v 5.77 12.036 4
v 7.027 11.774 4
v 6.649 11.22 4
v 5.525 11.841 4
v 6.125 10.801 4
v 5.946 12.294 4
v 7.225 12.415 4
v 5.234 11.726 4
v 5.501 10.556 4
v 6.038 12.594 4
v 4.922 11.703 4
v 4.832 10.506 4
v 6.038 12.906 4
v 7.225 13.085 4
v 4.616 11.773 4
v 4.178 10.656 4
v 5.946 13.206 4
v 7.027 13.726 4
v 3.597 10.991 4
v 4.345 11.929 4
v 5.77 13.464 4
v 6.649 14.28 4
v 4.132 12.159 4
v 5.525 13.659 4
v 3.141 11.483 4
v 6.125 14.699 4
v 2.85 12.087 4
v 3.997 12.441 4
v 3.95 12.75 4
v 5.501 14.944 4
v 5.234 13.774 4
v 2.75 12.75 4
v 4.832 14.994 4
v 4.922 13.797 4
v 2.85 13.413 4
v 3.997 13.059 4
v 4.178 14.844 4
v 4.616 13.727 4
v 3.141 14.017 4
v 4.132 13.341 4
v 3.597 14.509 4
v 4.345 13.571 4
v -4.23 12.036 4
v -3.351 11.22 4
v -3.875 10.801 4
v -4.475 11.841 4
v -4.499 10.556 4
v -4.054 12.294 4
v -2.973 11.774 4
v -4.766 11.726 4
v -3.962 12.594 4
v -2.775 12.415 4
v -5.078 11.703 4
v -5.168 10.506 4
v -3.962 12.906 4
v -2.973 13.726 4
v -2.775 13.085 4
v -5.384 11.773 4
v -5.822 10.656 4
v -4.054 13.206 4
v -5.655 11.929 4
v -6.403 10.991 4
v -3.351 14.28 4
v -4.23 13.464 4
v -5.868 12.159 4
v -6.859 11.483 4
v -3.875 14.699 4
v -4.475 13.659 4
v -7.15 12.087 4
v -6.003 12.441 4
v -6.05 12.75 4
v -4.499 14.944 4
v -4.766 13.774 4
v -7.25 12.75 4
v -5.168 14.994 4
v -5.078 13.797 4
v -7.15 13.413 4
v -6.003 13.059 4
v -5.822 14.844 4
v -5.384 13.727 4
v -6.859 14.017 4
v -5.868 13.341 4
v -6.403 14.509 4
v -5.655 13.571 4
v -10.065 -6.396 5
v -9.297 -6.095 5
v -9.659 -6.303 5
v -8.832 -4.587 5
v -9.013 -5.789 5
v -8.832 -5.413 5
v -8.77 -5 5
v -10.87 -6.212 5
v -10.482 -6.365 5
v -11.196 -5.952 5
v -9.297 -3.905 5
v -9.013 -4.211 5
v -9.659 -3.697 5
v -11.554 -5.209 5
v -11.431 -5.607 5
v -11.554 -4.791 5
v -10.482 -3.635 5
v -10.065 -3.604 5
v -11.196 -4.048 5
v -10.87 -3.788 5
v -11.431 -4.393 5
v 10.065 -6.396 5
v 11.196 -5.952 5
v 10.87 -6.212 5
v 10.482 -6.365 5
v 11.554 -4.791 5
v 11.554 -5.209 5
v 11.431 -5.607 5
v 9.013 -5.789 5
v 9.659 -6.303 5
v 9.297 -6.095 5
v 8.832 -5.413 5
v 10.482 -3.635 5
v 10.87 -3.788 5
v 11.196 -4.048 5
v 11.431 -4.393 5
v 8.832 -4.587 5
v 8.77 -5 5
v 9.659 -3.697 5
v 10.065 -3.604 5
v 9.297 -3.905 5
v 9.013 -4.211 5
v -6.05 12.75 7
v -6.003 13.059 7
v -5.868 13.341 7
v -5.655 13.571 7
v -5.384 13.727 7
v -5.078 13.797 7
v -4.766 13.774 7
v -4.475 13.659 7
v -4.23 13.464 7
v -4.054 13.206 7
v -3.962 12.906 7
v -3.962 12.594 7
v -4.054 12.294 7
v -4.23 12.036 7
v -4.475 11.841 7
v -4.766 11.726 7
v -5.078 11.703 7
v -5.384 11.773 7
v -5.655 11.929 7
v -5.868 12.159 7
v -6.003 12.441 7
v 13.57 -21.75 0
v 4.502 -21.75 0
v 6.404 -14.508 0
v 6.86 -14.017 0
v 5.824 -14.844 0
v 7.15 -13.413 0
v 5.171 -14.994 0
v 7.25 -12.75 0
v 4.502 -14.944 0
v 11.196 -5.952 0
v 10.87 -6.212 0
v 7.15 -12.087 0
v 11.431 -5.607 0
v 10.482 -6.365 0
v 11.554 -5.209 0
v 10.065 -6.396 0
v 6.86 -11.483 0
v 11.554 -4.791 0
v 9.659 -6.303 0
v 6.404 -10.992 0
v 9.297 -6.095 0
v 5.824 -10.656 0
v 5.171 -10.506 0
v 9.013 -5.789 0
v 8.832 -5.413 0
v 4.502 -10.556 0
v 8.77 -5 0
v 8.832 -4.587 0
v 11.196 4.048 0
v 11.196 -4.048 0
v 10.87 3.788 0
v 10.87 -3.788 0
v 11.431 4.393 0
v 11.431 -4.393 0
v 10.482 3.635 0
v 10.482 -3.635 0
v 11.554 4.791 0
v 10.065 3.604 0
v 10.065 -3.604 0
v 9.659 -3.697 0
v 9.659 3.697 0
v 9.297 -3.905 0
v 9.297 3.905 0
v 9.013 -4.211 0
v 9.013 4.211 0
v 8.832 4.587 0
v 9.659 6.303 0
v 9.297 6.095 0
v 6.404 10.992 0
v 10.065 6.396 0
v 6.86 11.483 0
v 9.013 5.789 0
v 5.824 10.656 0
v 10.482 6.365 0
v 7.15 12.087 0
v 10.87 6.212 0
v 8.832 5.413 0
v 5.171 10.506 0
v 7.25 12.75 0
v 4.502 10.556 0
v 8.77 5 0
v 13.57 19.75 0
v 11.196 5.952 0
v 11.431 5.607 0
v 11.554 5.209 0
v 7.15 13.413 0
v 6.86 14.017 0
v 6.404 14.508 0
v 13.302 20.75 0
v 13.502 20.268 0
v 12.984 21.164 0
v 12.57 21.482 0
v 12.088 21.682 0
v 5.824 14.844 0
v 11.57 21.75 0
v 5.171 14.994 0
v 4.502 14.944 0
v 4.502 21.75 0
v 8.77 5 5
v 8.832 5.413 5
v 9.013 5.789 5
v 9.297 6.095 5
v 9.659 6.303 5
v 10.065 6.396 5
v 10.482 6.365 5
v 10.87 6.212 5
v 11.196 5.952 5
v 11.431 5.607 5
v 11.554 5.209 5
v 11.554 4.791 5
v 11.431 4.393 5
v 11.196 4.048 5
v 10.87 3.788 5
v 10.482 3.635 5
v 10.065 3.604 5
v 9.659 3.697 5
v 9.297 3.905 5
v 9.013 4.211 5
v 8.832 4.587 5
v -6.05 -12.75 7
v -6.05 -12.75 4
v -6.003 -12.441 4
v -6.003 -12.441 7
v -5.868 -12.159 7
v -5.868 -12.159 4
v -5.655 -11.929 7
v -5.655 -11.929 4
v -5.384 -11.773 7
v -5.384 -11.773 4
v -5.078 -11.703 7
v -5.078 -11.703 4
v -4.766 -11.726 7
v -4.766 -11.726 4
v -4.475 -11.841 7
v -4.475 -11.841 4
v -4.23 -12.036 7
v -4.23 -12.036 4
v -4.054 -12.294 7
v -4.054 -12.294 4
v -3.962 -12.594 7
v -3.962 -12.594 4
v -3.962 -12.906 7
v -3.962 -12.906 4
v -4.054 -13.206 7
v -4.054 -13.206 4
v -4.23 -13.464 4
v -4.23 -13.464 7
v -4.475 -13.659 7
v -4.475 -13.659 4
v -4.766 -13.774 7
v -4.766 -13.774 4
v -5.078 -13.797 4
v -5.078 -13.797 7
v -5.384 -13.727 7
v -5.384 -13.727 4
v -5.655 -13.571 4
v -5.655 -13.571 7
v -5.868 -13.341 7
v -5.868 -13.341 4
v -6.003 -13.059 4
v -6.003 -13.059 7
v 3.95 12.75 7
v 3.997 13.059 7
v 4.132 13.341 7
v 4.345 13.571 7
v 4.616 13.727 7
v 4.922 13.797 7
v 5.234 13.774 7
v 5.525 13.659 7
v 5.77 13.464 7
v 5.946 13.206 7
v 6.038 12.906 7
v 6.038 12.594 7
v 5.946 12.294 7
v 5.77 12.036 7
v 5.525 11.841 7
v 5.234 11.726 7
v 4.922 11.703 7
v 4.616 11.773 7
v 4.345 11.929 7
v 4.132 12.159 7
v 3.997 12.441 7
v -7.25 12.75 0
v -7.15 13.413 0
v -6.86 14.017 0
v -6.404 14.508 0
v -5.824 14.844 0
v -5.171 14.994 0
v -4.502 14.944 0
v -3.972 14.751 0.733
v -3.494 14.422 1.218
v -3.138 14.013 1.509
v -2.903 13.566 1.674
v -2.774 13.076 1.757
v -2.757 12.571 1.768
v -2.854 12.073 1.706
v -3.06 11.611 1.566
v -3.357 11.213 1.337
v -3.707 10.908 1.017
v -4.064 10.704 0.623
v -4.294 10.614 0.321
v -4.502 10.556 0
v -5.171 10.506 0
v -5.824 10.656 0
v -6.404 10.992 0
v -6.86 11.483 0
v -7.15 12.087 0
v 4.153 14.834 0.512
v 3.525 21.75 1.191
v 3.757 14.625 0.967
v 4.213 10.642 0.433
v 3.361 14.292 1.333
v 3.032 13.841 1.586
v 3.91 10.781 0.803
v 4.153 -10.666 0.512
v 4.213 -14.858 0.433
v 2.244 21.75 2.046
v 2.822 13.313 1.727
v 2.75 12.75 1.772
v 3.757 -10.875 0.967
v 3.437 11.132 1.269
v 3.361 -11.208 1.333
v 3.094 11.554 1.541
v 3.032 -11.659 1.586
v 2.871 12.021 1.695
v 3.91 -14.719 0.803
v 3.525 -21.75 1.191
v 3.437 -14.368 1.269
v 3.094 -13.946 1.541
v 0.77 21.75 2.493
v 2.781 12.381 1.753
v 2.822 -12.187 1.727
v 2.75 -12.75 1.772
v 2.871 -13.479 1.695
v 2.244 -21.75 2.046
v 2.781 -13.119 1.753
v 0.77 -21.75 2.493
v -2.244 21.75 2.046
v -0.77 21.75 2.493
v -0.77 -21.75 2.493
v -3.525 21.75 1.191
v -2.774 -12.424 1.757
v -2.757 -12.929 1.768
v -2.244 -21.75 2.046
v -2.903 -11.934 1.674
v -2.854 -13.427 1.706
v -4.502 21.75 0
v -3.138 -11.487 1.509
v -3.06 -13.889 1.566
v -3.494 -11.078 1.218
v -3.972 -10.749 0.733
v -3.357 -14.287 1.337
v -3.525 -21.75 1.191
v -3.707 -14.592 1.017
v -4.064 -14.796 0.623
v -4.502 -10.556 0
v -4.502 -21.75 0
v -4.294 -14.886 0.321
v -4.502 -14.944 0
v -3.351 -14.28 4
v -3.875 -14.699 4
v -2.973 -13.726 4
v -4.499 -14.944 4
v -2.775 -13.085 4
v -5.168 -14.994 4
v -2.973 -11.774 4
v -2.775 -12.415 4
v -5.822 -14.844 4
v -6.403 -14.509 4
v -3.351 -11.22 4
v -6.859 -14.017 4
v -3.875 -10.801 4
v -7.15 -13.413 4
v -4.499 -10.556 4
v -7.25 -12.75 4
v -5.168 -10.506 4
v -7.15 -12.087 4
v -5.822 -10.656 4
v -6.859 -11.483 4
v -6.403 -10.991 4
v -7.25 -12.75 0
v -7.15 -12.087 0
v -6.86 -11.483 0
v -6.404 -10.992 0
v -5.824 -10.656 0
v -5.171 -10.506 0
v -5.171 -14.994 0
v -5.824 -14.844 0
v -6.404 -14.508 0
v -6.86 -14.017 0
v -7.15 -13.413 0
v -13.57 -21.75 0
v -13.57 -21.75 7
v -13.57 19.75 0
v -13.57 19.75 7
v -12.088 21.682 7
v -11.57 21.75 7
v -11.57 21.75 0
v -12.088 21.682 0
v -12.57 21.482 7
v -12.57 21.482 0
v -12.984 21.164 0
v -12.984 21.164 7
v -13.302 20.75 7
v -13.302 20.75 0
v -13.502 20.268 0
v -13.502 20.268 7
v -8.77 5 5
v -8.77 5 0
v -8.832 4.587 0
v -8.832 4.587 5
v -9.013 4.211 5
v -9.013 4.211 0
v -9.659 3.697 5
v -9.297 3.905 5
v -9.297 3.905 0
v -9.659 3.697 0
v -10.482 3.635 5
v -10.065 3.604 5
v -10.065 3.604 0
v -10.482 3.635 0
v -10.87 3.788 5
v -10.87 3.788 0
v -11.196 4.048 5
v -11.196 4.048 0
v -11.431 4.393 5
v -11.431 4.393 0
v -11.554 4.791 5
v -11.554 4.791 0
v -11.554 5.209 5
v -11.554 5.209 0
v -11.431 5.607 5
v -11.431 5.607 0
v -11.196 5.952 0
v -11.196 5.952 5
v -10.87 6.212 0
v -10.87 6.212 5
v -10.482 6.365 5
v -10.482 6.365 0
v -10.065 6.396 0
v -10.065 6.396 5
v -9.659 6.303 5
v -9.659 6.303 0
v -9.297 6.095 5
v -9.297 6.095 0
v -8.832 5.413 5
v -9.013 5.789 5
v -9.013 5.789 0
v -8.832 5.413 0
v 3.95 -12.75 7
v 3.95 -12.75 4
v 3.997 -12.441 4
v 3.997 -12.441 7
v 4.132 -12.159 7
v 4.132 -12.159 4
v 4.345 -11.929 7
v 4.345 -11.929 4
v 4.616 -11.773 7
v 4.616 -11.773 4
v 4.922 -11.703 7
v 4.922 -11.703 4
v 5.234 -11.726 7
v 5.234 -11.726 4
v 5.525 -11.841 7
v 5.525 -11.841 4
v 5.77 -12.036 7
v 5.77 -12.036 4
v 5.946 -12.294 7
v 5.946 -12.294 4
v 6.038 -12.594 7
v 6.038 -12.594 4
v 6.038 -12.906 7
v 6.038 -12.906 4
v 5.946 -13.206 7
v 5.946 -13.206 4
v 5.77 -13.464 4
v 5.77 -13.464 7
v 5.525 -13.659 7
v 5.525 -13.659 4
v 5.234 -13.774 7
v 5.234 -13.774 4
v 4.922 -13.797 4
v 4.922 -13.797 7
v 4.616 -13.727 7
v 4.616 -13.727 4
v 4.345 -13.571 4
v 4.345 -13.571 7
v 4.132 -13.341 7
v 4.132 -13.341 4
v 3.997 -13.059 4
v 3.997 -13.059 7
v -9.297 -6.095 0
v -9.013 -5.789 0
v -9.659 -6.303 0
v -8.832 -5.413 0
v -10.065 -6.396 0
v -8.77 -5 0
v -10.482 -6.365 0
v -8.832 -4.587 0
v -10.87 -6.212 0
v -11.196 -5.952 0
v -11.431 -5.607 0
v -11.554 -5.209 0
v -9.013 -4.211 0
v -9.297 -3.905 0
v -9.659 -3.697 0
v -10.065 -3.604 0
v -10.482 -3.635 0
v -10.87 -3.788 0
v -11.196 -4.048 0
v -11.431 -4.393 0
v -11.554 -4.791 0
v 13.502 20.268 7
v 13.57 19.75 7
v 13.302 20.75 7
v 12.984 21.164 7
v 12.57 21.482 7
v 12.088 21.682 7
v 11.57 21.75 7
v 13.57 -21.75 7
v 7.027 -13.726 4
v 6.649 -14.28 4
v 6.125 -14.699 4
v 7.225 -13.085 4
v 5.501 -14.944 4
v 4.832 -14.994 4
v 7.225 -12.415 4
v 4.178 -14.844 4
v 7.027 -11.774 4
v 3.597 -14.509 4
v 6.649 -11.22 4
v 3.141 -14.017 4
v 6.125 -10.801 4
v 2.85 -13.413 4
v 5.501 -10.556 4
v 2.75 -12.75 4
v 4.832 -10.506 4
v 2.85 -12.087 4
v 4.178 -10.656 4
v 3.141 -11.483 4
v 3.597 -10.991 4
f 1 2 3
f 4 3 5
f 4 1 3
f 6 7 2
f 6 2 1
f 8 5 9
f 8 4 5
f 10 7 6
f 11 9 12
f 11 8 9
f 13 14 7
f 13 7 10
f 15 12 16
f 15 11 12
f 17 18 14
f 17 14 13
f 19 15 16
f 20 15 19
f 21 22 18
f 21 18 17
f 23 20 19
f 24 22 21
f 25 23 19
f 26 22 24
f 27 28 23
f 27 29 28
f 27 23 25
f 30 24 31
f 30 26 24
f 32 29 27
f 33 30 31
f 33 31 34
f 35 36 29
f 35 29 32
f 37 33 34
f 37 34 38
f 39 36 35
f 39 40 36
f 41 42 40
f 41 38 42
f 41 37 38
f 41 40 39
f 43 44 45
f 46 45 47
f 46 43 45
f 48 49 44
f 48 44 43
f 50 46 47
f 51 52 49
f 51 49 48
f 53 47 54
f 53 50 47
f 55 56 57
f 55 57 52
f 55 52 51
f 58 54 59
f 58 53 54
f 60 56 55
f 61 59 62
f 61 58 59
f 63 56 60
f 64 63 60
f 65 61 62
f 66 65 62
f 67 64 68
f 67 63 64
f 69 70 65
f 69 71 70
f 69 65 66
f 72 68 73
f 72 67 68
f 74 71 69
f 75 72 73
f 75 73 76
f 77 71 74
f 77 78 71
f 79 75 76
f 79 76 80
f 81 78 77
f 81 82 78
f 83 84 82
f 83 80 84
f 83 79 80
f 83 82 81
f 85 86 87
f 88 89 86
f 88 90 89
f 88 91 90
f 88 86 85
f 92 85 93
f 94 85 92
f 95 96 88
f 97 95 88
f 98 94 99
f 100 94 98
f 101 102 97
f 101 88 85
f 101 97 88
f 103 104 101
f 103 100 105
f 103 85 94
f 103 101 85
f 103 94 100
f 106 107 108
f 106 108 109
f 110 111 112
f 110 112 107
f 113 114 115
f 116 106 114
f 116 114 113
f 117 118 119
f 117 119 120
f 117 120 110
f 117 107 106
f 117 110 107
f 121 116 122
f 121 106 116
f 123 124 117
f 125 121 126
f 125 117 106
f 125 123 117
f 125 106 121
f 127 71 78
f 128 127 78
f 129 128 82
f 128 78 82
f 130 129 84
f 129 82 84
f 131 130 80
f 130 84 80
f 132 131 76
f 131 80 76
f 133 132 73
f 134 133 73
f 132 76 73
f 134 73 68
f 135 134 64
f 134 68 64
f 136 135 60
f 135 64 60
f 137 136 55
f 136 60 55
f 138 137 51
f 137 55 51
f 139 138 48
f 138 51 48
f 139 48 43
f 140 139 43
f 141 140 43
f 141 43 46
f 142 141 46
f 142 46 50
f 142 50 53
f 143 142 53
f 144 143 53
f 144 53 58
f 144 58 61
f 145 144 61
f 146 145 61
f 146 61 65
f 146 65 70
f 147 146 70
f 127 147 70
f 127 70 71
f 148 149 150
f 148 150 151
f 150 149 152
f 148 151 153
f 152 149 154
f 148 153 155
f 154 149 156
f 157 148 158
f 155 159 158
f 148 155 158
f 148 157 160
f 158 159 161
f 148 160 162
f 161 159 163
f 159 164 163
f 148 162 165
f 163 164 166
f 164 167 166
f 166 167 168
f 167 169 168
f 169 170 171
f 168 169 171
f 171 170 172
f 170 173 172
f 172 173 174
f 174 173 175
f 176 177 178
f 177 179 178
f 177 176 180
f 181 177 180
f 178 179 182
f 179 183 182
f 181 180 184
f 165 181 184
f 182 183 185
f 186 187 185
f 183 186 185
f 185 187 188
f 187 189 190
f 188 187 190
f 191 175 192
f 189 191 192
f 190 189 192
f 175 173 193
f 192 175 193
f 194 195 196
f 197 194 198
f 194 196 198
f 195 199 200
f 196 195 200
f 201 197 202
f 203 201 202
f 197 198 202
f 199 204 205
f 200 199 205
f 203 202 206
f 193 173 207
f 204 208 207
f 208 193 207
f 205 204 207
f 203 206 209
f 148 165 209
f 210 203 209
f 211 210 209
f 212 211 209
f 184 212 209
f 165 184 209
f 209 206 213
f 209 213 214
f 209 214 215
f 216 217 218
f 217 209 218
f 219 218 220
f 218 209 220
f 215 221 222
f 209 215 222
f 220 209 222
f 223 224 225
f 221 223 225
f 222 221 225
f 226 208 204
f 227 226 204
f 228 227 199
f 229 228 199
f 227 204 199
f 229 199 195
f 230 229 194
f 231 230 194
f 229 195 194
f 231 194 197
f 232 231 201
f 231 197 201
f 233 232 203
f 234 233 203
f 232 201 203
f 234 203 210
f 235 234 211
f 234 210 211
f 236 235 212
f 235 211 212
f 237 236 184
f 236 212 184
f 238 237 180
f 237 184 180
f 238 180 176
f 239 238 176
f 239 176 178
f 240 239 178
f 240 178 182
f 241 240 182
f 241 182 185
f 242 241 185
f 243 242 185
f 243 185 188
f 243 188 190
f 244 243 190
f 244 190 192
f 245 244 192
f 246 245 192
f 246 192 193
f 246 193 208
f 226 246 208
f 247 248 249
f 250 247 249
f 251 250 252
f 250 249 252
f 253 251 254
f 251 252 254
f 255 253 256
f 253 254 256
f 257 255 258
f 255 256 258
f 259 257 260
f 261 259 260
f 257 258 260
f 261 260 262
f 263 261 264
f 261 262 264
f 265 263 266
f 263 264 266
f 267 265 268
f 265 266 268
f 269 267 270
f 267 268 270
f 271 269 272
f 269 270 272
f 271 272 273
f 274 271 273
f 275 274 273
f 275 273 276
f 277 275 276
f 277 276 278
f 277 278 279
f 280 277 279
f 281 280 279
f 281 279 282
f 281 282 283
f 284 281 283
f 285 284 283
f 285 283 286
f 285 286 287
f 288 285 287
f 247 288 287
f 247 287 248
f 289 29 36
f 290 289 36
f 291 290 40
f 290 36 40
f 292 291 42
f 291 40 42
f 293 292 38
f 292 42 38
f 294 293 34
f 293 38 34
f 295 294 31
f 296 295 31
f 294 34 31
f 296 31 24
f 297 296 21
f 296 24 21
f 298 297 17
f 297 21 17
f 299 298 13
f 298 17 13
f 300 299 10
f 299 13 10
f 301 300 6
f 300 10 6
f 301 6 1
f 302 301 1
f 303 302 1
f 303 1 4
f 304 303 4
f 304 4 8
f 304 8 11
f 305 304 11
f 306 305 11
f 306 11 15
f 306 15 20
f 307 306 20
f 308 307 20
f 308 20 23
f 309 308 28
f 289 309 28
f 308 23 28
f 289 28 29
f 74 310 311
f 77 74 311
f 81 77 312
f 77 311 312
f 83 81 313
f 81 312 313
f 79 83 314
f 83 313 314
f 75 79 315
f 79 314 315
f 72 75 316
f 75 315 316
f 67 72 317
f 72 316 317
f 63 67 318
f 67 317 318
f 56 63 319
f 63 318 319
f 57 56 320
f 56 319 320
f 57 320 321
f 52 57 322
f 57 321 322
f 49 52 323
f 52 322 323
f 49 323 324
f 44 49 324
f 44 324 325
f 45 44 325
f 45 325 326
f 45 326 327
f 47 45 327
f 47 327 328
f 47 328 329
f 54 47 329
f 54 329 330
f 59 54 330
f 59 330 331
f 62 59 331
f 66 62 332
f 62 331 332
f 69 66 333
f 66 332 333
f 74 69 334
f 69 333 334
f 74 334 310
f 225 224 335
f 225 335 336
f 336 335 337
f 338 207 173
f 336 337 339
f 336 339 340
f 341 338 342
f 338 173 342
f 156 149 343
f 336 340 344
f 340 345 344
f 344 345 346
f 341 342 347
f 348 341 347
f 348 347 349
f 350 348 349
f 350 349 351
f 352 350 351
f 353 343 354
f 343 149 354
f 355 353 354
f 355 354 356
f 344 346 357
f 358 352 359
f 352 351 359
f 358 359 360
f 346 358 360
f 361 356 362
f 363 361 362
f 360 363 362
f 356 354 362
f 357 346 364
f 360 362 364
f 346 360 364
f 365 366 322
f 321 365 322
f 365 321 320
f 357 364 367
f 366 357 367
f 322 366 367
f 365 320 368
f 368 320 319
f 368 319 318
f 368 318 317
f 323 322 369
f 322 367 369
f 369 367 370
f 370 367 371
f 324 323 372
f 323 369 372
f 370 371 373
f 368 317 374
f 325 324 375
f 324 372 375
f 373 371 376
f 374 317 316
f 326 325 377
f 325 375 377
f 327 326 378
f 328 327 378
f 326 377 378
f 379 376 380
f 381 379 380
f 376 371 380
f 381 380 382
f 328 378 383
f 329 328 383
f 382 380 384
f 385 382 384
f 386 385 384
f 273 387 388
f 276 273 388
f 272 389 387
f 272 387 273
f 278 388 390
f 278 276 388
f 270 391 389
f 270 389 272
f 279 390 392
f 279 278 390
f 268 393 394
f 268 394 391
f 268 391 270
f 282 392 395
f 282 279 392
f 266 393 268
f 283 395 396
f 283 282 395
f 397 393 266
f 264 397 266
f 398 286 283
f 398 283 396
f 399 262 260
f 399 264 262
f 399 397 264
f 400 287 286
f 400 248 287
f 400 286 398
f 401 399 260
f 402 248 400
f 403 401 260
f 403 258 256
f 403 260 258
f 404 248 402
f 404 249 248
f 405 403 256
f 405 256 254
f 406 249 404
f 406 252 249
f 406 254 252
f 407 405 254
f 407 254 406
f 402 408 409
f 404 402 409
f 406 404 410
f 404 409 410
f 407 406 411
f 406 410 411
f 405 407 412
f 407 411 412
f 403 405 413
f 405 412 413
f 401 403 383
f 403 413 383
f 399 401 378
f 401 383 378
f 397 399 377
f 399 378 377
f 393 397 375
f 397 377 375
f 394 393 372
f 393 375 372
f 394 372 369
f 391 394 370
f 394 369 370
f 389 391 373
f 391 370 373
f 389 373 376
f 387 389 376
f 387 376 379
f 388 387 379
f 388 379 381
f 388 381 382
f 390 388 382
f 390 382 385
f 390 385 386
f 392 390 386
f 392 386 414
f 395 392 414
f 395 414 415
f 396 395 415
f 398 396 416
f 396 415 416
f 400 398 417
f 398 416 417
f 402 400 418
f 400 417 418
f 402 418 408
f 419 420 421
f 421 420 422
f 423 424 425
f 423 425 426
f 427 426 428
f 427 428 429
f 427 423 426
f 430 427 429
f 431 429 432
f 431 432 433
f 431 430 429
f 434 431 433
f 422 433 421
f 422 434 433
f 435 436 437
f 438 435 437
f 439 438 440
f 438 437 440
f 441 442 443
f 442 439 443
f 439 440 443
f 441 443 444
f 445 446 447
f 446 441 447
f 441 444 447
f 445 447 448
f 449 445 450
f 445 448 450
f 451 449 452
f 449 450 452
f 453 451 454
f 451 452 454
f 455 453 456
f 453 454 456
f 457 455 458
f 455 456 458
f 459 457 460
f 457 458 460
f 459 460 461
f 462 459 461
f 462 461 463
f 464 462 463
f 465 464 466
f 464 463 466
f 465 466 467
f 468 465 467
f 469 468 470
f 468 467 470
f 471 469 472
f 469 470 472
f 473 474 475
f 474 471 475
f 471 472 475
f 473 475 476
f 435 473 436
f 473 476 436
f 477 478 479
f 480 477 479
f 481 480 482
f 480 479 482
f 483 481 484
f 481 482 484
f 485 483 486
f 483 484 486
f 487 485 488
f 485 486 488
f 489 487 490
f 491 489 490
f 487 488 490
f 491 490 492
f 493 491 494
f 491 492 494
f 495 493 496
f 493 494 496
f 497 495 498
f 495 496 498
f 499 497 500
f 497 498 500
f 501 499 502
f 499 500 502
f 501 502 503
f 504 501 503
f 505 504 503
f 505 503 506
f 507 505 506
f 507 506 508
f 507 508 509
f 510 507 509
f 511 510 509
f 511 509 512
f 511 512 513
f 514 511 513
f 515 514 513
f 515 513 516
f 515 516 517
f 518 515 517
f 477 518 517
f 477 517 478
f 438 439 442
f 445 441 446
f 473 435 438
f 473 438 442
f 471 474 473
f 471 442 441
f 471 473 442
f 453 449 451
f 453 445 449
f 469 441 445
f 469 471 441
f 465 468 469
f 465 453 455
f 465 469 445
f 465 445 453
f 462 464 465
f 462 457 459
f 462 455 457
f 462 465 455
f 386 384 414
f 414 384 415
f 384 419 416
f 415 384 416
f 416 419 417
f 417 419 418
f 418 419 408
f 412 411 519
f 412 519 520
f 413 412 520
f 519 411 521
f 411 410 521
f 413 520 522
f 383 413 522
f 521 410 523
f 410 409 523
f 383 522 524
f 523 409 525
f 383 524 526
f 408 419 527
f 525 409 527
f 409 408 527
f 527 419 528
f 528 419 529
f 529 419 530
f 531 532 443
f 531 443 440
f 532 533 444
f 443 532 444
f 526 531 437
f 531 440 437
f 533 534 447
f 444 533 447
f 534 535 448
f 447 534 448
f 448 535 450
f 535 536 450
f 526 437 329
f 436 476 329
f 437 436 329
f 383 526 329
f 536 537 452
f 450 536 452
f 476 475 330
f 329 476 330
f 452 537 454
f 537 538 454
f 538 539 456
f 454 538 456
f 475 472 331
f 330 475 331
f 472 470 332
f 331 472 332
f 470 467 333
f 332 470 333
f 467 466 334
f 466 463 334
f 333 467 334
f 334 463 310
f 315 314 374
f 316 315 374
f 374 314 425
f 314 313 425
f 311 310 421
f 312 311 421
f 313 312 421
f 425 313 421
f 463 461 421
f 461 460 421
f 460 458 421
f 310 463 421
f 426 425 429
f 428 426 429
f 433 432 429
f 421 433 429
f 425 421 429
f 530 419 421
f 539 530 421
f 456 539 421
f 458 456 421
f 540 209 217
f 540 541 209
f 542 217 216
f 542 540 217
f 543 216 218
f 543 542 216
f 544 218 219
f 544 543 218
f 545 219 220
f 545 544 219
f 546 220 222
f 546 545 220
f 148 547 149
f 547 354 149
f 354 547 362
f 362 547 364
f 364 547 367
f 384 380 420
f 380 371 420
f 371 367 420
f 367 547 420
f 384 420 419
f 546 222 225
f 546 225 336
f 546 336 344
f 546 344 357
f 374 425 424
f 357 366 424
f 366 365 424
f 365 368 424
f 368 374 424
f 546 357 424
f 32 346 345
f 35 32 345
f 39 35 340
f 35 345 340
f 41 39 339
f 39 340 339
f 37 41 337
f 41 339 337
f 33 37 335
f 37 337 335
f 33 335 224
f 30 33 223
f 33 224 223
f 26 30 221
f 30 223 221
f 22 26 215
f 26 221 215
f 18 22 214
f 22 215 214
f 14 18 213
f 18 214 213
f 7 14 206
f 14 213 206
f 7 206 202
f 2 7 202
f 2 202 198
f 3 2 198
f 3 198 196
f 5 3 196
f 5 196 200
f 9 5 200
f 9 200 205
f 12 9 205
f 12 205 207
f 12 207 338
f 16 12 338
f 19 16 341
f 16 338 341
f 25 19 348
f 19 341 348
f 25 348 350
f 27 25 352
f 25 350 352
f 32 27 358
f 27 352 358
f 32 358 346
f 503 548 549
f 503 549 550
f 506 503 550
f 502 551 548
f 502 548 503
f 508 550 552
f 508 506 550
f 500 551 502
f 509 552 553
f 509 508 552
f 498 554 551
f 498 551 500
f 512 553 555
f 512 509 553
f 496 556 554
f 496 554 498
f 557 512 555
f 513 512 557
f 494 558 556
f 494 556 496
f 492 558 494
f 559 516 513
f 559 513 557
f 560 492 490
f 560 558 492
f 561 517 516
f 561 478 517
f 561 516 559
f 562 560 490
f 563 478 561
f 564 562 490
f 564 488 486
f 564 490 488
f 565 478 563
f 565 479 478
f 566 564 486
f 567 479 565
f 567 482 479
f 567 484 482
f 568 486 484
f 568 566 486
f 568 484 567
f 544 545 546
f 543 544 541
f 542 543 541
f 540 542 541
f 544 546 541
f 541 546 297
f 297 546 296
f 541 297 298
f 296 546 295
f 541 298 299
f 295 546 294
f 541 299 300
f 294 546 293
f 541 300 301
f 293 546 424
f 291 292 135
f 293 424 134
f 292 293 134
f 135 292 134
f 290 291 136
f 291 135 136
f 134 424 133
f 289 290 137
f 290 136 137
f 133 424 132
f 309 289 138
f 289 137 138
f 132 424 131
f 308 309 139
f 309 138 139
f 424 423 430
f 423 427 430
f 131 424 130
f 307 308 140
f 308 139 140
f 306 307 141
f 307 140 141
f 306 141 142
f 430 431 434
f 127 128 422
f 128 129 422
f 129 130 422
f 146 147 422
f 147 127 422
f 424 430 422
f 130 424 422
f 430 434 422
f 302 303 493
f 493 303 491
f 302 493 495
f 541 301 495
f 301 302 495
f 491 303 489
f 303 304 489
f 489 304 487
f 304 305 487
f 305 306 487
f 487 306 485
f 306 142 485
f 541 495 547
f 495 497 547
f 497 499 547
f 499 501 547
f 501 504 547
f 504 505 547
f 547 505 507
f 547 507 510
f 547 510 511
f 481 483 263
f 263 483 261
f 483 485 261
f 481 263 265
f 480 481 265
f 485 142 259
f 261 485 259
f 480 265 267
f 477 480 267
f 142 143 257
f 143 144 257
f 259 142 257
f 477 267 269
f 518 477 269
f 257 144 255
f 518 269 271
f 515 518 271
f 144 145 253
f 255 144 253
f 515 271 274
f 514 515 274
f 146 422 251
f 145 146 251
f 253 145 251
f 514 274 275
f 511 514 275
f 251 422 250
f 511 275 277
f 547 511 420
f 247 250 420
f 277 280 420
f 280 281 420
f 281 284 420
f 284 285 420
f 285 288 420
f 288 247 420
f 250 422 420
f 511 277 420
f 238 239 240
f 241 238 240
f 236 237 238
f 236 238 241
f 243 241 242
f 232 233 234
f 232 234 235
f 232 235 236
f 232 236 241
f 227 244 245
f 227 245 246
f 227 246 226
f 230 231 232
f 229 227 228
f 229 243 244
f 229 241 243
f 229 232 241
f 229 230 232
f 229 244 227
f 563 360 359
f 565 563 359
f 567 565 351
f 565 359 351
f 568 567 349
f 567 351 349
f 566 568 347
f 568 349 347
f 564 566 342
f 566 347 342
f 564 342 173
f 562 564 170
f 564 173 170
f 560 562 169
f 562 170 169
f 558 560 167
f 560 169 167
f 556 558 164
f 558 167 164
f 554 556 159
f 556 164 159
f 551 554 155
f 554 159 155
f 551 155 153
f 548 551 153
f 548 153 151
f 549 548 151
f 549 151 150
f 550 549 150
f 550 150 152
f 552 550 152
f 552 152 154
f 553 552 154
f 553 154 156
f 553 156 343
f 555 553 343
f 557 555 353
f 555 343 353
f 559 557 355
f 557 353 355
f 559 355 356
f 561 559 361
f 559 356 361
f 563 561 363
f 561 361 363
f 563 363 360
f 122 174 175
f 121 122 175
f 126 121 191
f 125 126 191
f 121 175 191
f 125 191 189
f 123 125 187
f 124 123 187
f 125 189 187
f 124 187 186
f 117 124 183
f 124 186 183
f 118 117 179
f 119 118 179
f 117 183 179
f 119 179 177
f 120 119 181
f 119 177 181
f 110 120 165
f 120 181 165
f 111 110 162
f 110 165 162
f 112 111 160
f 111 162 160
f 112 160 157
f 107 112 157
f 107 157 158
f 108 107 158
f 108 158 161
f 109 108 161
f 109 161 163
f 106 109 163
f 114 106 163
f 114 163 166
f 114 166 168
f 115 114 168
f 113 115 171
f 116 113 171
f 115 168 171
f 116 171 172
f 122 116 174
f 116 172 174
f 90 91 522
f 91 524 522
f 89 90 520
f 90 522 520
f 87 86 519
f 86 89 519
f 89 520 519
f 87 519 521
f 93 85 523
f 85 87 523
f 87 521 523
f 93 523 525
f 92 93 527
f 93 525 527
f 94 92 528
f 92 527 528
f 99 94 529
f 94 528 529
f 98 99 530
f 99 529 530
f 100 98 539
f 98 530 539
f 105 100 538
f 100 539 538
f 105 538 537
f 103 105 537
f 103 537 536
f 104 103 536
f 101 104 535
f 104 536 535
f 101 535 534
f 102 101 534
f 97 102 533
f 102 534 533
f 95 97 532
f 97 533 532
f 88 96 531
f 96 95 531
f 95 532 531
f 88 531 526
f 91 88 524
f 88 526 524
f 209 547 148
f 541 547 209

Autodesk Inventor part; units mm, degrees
ref_plane "YZ Plane" through (0, 0, 0) normal (1, 0, 0) x (0, 1, 0)
ref_plane "XZ Plane" through (0, 0, 0) normal (0, 1, 0) x (-1, 0, 0)
ref_plane "XY Plane" through (0, 0, 0) normal (0, 0, 1) x (1, 0, 0)
sketch "스케치1" plane through (0, 0, 0) normal (1, 0, 0) x (0, 1, 0)
  line L0 (21.75, 7) -> (-21.75, 7)
  line L1 (-21.75, 7) -> (-21.75, 0)
  line L2 (-21.75, 0) -> (-3.25, 0)
  line L3 (-3.25, 0) -> (-3.25, 0)
  line L4 (-3.25, 0) -> (21.75, 0)
  line L5 (21.75, 0) -> (21.75, 7)
  point P0 (0, 0)
  point P1 (0, 7)
  dimension "d0" = 43.5
  dimension "d1" = 25
  dimension "d2" = 7
  dimension "d3" = 7
extrude "돌출1" add sketch "스케치1" along normal mid plane 27.14
sketch "스케치2" plane through (13.57, 21.75, 0) normal (0, 0, -1) x (-1, 0, 0)
  circle A0 centre (8.57, -9) radius 1.05
  circle A1 centre (18.57, -9) radius 1.05
  circle A2 centre (8.57, -34.5) radius 1.05
  circle A3 centre (18.57, -34.5) radius 1.05
  line L0 (8.57, -9) -> (18.57, -9) construction
  line L1 (8.57, -34.5) -> (18.57, -34.5) construction
  line L2 (27.14, -43.5) -> (0, -43.5) projected
  point P0 (13.57, -21.75)
  point P1 (13.57, -34.5)
  point P2 (13.57, -9)
  dimension "d41" = 2.1
  dimension "d42" = 2.1
  dimension "d43" = 2.1
  dimension "d44" = 2.1
  dimension "d45" = 25.5
  dimension "d46" = 9
  dimension "d47" = 10
  dimension "d48" = 10
extrude "돌출2" cut sketch "스케치2" against normal through all
sketch "스케치3" plane through (13.57, 21.75, 0) normal (0, 0, -1) x (-1, 0, 0)
  circle A0 centre (18.57, -34.5) radius 1.05 projected
  circle A1 centre (18.57, -9) radius 1.05 projected
  circle A2 centre (8.57, -34.5) radius 1.05 projected
  circle A3 centre (8.57, -9) radius 1.05 projected
  line L0 (27.14, 0) -> (0, 0) projected
  line L1 (0, -43.5) -> (0, 0) projected
  line L2 (27.14, -43.5) -> (0, -43.5) projected
  line L3 (27.14, 0) -> (27.14, -43.5) projected
  circle A4 centre (8.57, -9) radius 1.05 projected
  circle A5 centre (8.57, -9) radius 2.25
  circle A6 centre (18.57, -9) radius 2.25
  circle A7 centre (8.57, -34.5) radius 1.05 projected
  circle A8 centre (8.57, -34.5) radius 2.25
  circle A9 centre (18.57, -34.5) radius 2.25
  point P0 (13.57, -21.75)
  dimension "d51" = 4.5
  dimension "d52" = 4.5
  dimension "d53" = 4.5
  dimension "d54" = 4.5
extrude "돌출3" cut sketch "스케치3" against normal blind 4 contours A5 | A6 | A8 | A9
sketch "스케치4" plane through (-13.57, -21.75, 0) normal (0, -1, 0) x (1, 0, 0)
  circle A0 centre (13.57, -2.7) radius 5.25
  line L0 (0, 0) -> (27.14, 0) projected
  line L1 (0, 0) -> (27.14, 0) projected
  point P0 (13.57, 0)
  point P1 (13.57, 0)
  point P2 (13.57, 0)
  dimension "d67" = 10.5
  dimension "d68" = 2.7
extrude "돌출4" cut sketch "스케치4" against normal through all
sketch "스케치5" plane through (13.57, -21.75, 0) normal (0, 0, -1) x (-1, 0, 0)
  line L0 (9.0675, 0) -> (9.0675, 6.8057) projected
  arc A0 (9.0675, 11.1943) -> (9.0675, 6.8057) centre (8.57, 9) ccw projected
  line L1 (9.0675, 11.1943) -> (9.0675, 32.3057) projected
  arc A1 (9.0675, 36.6943) -> (9.0675, 32.3057) centre (8.57, 34.5) ccw projected
  line L2 (9.0675, 36.6943) -> (9.0675, 43.5) projected
  line L3 (9.0675, 43.5) -> (0, 43.5) projected
  line L4 (0, 0) -> (0, 43.5) projected
  line L5 (9.0675, 0) -> (0, 0) projected
  circle A2 centre (3.4, 26.75) radius 1.4
  circle A3 centre (3.4, 16.75) radius 1.4
  line L6 (9.0675, 0) -> (0, 0) projected
  point P0 (13.57, 21.75)
  point P1 (4.5338, 0)
  point P2 (4.5338, 0)
  dimension "d71" = 2.8
  dimension "d72" = 2.8
  dimension "d78" = 3.4
  dimension "d79" = 26.75
  dimension "d80" = 16.75
extrude "돌출5" cut sketch "스케치5" against normal blind 5 contours A2 | A3
mirror "미러1" about plane through (0, 0, 0) normal (1, 0, 0) of "돌출5"
fillet "모깎기2" radius 2 2 edges at (13.57, 21.75, 3.5) (-13.57, 21.75, 3.5)
ref_plane "작업 평면1" through (0, 0, 0) normal (1, 0, 0) x (0, 1, 0)
properties part number "end_arm_수정"
